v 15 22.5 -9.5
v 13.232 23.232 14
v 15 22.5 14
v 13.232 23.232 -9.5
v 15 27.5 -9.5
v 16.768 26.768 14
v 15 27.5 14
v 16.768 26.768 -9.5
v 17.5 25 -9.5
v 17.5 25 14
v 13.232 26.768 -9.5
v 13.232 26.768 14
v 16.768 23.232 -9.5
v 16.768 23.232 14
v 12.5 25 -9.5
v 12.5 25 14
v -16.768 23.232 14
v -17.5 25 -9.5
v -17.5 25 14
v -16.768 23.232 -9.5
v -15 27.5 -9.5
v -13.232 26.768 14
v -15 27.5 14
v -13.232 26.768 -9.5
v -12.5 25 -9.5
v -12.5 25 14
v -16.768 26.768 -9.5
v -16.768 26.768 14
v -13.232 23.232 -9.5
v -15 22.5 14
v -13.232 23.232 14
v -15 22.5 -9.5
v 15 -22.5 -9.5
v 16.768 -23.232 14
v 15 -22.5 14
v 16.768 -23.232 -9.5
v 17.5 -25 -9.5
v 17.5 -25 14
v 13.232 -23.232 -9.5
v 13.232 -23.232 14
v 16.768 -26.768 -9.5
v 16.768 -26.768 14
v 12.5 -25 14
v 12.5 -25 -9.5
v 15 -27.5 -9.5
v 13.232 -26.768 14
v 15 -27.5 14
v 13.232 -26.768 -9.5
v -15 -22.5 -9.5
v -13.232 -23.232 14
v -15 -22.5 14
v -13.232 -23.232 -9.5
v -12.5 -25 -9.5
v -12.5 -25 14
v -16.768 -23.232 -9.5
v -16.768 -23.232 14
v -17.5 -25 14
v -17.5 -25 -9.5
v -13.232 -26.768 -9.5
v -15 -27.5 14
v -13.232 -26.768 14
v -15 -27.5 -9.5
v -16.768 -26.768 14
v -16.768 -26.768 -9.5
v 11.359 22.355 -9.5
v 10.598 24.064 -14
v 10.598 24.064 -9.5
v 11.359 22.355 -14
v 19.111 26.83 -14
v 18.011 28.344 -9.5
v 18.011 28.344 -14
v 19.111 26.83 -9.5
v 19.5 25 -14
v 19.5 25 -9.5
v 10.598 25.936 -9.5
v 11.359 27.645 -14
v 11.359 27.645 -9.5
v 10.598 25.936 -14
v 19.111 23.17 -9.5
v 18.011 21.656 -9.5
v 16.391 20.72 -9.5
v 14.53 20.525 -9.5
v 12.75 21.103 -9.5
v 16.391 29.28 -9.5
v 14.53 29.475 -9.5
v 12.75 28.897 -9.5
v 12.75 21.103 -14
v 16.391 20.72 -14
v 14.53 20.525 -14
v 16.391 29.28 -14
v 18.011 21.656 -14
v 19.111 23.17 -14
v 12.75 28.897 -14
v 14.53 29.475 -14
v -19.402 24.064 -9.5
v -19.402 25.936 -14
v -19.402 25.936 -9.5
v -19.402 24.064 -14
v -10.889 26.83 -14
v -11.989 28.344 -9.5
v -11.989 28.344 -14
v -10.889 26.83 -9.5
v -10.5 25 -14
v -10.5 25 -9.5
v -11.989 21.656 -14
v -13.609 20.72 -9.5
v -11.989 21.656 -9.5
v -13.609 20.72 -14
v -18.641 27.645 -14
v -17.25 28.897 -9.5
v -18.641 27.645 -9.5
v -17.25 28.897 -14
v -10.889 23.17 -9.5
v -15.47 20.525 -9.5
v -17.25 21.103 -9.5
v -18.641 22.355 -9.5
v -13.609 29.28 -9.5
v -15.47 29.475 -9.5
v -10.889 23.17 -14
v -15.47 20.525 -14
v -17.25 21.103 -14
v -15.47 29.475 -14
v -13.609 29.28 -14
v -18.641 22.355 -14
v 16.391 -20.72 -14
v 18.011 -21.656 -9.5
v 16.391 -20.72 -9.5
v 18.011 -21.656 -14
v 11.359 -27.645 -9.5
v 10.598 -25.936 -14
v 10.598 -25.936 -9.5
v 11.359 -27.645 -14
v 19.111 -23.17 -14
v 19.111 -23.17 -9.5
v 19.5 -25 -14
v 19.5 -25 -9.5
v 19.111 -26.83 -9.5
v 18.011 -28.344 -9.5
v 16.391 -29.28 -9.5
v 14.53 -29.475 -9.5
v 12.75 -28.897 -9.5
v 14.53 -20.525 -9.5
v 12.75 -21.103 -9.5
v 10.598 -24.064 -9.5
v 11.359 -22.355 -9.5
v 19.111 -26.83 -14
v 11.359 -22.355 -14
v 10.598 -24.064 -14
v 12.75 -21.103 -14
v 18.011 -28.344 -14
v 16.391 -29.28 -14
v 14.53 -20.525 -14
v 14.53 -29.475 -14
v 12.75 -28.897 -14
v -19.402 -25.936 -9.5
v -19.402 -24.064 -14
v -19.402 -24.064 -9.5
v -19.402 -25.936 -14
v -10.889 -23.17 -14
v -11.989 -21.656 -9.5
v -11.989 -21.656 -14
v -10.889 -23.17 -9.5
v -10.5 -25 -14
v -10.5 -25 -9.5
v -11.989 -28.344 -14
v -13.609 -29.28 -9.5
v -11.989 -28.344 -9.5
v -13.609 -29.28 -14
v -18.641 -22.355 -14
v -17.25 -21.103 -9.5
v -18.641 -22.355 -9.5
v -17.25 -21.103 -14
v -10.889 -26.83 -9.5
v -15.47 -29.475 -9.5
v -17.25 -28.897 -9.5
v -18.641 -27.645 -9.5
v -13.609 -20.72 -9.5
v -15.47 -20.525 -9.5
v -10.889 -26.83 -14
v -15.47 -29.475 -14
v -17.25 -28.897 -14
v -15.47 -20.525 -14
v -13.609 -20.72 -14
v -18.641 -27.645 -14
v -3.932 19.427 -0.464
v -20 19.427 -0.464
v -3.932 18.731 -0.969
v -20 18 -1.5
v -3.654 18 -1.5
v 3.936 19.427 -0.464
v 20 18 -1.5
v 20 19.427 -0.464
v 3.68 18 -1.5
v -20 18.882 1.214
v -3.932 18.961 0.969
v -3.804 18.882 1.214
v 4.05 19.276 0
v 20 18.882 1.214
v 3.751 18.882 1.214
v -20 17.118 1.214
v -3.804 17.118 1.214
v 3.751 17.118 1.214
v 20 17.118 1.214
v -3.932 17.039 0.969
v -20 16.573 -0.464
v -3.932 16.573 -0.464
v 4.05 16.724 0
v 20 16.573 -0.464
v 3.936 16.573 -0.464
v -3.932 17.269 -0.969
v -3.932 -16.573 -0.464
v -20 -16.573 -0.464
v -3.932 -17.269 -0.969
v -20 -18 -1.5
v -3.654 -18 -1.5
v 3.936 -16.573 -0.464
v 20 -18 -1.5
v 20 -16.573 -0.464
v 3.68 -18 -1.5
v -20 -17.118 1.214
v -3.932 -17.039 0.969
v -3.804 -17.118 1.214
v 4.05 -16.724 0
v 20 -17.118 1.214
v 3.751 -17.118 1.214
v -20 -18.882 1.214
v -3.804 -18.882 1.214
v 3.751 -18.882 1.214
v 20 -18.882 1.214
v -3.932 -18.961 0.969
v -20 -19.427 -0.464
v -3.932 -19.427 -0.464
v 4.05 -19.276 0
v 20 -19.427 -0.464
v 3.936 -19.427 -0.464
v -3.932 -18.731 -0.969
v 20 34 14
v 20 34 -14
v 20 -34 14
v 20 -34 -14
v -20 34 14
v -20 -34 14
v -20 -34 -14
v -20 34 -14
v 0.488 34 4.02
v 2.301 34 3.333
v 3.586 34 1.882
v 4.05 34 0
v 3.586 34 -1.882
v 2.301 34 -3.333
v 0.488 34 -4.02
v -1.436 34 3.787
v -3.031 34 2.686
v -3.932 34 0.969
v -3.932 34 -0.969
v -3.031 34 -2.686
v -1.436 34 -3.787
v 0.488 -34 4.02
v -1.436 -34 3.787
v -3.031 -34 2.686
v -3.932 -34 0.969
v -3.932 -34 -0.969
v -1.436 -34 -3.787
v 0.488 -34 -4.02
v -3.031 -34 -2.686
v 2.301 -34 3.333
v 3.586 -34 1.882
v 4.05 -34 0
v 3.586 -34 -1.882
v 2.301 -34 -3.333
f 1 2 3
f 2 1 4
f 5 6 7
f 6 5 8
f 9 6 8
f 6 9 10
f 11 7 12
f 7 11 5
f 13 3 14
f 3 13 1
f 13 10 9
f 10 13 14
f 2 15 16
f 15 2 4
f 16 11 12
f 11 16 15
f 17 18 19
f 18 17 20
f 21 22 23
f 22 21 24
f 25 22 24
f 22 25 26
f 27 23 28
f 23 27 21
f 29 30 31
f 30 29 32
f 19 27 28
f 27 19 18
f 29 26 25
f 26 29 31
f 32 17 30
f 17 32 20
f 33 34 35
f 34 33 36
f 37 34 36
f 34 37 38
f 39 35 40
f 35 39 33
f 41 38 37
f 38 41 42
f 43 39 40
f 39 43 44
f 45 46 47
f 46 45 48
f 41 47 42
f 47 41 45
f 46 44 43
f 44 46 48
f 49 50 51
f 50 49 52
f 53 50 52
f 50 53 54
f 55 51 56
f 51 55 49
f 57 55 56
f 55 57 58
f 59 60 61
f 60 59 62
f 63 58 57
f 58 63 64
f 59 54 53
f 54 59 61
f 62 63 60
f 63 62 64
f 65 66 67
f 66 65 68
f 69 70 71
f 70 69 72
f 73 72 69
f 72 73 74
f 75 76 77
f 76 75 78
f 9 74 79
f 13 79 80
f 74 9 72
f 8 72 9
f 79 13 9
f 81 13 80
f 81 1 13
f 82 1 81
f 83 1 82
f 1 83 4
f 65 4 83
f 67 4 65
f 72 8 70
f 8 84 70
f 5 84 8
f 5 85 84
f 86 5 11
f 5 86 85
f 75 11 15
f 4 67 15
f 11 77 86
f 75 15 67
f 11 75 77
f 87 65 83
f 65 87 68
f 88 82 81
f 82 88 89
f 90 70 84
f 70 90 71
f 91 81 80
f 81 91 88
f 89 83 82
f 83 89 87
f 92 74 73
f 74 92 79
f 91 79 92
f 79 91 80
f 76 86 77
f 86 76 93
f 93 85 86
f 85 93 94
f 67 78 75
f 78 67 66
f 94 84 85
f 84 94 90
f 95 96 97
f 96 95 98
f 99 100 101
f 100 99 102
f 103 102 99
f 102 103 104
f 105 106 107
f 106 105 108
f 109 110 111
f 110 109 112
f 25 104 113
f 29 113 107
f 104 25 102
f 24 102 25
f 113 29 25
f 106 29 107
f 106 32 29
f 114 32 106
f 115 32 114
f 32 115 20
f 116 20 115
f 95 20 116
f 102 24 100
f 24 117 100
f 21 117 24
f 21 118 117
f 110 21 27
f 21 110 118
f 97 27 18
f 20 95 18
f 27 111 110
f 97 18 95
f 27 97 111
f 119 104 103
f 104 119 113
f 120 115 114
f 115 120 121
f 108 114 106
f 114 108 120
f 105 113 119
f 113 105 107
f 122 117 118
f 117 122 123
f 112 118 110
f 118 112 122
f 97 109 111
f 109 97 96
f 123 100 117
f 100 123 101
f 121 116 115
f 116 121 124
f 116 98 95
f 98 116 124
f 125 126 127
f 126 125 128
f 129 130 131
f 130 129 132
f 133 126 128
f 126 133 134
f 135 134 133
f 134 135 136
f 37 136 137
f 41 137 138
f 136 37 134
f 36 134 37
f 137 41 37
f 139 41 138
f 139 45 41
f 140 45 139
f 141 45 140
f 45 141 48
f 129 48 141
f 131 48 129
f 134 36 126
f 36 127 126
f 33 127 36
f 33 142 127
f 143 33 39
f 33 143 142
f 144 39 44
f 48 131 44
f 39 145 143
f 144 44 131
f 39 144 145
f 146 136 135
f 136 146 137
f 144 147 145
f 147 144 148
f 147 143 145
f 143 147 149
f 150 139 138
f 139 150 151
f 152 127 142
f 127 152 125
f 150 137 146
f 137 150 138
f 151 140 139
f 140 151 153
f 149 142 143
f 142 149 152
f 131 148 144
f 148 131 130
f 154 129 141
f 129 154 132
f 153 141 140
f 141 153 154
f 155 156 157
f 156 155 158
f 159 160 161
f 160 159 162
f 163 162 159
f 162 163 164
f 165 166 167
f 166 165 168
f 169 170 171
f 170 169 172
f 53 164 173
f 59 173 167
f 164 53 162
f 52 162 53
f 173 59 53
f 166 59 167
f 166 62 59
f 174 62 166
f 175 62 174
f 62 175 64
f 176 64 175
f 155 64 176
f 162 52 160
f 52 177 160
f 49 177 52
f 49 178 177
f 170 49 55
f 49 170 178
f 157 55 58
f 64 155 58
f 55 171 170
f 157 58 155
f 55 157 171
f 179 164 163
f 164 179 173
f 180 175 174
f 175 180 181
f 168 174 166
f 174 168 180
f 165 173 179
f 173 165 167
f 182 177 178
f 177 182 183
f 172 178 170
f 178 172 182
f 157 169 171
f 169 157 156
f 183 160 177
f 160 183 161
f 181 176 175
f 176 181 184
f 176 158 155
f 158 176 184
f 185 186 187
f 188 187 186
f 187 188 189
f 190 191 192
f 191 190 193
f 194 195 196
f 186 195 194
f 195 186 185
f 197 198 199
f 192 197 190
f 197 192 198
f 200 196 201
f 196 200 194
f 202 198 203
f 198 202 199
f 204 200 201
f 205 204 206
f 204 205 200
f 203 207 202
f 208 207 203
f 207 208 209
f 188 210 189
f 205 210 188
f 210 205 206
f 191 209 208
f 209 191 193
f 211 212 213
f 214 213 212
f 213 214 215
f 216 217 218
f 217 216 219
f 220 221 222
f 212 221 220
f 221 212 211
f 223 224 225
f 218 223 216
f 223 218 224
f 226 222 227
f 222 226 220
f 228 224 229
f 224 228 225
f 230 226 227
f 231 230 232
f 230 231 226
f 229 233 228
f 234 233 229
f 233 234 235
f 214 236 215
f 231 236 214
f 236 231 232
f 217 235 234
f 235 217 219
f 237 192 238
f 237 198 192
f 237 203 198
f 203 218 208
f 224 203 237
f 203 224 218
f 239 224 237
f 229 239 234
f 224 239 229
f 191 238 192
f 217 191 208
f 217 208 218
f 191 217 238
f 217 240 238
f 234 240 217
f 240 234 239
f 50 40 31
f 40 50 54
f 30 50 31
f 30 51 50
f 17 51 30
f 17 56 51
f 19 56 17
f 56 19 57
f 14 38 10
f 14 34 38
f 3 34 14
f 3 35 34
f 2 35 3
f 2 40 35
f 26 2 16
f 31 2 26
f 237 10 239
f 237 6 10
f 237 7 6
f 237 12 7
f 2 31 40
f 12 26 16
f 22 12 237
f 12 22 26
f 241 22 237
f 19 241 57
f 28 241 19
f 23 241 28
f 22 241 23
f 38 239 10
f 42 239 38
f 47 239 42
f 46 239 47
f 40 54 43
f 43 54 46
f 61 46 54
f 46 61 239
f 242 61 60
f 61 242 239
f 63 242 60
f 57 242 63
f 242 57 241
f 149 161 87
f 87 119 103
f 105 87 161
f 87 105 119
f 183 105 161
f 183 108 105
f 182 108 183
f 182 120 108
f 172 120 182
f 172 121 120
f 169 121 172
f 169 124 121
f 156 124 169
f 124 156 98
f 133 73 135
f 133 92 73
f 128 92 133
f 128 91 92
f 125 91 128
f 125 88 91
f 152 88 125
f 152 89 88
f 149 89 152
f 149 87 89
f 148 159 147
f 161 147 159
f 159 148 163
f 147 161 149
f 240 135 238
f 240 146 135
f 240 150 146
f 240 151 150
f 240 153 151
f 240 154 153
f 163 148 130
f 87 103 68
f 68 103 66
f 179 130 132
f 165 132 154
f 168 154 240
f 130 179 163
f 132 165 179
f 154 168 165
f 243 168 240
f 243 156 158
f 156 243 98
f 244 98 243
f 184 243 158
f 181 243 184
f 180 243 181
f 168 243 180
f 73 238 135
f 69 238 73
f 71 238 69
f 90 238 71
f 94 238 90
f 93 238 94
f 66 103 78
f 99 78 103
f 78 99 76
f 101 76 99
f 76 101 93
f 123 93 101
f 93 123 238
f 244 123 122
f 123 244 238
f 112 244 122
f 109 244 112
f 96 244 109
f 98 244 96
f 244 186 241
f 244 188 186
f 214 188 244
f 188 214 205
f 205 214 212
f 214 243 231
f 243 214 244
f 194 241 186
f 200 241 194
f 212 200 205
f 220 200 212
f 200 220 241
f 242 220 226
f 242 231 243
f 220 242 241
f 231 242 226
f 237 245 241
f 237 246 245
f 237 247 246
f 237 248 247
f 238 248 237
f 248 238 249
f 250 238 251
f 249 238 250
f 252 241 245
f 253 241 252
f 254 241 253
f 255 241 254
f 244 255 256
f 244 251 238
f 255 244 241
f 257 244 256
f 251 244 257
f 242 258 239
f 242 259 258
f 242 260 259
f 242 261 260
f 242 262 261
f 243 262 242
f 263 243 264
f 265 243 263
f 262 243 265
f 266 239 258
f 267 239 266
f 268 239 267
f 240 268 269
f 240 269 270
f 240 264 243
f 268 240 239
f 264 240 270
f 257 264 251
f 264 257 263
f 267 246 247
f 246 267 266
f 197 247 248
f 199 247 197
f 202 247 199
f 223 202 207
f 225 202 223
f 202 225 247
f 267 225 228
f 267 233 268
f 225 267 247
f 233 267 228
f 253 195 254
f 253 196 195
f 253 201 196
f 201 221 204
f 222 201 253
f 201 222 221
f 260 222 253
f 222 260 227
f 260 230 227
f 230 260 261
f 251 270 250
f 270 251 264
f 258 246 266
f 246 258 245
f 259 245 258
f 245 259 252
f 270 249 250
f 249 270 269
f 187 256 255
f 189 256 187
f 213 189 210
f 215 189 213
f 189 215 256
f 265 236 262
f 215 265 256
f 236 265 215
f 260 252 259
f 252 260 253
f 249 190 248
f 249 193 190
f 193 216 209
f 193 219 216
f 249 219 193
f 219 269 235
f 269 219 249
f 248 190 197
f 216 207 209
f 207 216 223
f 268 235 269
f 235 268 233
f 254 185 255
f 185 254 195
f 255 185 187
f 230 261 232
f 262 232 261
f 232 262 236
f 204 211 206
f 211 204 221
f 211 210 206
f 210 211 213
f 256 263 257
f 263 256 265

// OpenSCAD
// Parameters
shaft_diameter = 8.0; //[4.0:16.0:0.1]
block_width = 40.0; //[20.0:80.0:0.5]
block_length = 68.0; //[34.0:136.0:0.5]
block_height = 28.0; //[14.0:56.0:0.5]
bore_clearance = 0.1; //[0.0:0.5:0.05]
mounting_hole_diameter = 5.0; //[3.0:8.0:0.1]
mounting_hole_spacing_x = 30.0; //[15.0:60.0:0.5]
mounting_hole_spacing_y = 50.0; //[25.0:100.0:0.5]
counterbore_diameter = 9.0; //[6.0:14.0:0.1]
counterbore_depth = 4.0; //[2.0:10.0:0.1]
retention_set_screw_diameter = 3.0; //[2.0:6.0:0.1]
retention_set_screw_offset_y = 18.0; //[8.0:30.0:0.5]
overlap = 1.0; //[0.5:2.0:0.1]

// Main block body
module block_body() {
  color("Silver") cube([block_width, block_length, block_height], center=true);
}

// Shaft bore
module shaft_bore() {
  rotate([90, 0, 0])
    translate([0, 0, 0])
    cylinder(h=block_length + 2*overlap, r=(shaft_diameter + bore_clearance)/2, center=true);
}

// Mounting holes
module mounting_holes() {
  union() {
    translate([mounting_hole_spacing_x/2, mounting_hole_spacing_y/2, 0])
      cylinder(h=block_height + 2*overlap, r=mounting_hole_diameter/2, center=true);
    translate([-mounting_hole_spacing_x/2, mounting_hole_spacing_y/2, 0])
      cylinder(h=block_height + 2*overlap, r=mounting_hole_diameter/2, center=true);
    translate([mounting_hole_spacing_x/2, -mounting_hole_spacing_y/2, 0])
      cylinder(h=block_height + 2*overlap, r=mounting_hole_diameter/2, center=true);
    translate([-mounting_hole_spacing_x/2, -mounting_hole_spacing_y/2, 0])
      cylinder(h=block_height + 2*overlap, r=mounting_hole_diameter/2, center=true);
  }
}

// Counterbores
module counterbores() {
  union() {
    translate([mounting_hole_spacing_x/2, mounting_hole_spacing_y/2, -block_height/2 + counterbore_depth/2])
      cylinder(h=counterbore_depth + overlap, r=counterbore_diameter/2, center=true);
    translate([-mounting_hole_spacing_x/2, mounting_hole_spacing_y/2, -block_height/2 + counterbore_depth/2])
      cylinder(h=counterbore_depth + overlap, r=counterbore_diameter/2, center=true);
    translate([mounting_hole_spacing_x/2, -mounting_hole_spacing_y/2, -block_height/2 + counterbore_depth/2])
      cylinder(h=counterbore_depth + overlap, r=counterbore_diameter/2, center=true);
    translate([-mounting_hole_spacing_x/2, -mounting_hole_spacing_y/2, -block_height/2 + counterbore_depth/2])
      cylinder(h=counterbore_depth + overlap, r=counterbore_diameter/2, center=true);
  }
}

// Retention set screw holes
module set_screw_holes() {
  union() {
    rotate([0, 90, 0])
      translate([0, retention_set_screw_offset_y, 0])
      cylinder(h=block_width + 2*overlap, r=retention_set_screw_diameter/2, center=true);
    rotate([0, 90, 0])
      translate([0, -retention_set_screw_offset_y, 0])
      cylinder(h=block_width + 2*overlap, r=retention_set_screw_diameter/2, center=true);
  }
}

// Final bearing block assembly
module bearing_block_final() {
  difference() {
    block_body();
    shaft_bore();
    mounting_holes();
    counterbores();
    set_screw_holes();
  }
}

// Assembly
module assembly() {
  bearing_block_final();
}

assembly();
